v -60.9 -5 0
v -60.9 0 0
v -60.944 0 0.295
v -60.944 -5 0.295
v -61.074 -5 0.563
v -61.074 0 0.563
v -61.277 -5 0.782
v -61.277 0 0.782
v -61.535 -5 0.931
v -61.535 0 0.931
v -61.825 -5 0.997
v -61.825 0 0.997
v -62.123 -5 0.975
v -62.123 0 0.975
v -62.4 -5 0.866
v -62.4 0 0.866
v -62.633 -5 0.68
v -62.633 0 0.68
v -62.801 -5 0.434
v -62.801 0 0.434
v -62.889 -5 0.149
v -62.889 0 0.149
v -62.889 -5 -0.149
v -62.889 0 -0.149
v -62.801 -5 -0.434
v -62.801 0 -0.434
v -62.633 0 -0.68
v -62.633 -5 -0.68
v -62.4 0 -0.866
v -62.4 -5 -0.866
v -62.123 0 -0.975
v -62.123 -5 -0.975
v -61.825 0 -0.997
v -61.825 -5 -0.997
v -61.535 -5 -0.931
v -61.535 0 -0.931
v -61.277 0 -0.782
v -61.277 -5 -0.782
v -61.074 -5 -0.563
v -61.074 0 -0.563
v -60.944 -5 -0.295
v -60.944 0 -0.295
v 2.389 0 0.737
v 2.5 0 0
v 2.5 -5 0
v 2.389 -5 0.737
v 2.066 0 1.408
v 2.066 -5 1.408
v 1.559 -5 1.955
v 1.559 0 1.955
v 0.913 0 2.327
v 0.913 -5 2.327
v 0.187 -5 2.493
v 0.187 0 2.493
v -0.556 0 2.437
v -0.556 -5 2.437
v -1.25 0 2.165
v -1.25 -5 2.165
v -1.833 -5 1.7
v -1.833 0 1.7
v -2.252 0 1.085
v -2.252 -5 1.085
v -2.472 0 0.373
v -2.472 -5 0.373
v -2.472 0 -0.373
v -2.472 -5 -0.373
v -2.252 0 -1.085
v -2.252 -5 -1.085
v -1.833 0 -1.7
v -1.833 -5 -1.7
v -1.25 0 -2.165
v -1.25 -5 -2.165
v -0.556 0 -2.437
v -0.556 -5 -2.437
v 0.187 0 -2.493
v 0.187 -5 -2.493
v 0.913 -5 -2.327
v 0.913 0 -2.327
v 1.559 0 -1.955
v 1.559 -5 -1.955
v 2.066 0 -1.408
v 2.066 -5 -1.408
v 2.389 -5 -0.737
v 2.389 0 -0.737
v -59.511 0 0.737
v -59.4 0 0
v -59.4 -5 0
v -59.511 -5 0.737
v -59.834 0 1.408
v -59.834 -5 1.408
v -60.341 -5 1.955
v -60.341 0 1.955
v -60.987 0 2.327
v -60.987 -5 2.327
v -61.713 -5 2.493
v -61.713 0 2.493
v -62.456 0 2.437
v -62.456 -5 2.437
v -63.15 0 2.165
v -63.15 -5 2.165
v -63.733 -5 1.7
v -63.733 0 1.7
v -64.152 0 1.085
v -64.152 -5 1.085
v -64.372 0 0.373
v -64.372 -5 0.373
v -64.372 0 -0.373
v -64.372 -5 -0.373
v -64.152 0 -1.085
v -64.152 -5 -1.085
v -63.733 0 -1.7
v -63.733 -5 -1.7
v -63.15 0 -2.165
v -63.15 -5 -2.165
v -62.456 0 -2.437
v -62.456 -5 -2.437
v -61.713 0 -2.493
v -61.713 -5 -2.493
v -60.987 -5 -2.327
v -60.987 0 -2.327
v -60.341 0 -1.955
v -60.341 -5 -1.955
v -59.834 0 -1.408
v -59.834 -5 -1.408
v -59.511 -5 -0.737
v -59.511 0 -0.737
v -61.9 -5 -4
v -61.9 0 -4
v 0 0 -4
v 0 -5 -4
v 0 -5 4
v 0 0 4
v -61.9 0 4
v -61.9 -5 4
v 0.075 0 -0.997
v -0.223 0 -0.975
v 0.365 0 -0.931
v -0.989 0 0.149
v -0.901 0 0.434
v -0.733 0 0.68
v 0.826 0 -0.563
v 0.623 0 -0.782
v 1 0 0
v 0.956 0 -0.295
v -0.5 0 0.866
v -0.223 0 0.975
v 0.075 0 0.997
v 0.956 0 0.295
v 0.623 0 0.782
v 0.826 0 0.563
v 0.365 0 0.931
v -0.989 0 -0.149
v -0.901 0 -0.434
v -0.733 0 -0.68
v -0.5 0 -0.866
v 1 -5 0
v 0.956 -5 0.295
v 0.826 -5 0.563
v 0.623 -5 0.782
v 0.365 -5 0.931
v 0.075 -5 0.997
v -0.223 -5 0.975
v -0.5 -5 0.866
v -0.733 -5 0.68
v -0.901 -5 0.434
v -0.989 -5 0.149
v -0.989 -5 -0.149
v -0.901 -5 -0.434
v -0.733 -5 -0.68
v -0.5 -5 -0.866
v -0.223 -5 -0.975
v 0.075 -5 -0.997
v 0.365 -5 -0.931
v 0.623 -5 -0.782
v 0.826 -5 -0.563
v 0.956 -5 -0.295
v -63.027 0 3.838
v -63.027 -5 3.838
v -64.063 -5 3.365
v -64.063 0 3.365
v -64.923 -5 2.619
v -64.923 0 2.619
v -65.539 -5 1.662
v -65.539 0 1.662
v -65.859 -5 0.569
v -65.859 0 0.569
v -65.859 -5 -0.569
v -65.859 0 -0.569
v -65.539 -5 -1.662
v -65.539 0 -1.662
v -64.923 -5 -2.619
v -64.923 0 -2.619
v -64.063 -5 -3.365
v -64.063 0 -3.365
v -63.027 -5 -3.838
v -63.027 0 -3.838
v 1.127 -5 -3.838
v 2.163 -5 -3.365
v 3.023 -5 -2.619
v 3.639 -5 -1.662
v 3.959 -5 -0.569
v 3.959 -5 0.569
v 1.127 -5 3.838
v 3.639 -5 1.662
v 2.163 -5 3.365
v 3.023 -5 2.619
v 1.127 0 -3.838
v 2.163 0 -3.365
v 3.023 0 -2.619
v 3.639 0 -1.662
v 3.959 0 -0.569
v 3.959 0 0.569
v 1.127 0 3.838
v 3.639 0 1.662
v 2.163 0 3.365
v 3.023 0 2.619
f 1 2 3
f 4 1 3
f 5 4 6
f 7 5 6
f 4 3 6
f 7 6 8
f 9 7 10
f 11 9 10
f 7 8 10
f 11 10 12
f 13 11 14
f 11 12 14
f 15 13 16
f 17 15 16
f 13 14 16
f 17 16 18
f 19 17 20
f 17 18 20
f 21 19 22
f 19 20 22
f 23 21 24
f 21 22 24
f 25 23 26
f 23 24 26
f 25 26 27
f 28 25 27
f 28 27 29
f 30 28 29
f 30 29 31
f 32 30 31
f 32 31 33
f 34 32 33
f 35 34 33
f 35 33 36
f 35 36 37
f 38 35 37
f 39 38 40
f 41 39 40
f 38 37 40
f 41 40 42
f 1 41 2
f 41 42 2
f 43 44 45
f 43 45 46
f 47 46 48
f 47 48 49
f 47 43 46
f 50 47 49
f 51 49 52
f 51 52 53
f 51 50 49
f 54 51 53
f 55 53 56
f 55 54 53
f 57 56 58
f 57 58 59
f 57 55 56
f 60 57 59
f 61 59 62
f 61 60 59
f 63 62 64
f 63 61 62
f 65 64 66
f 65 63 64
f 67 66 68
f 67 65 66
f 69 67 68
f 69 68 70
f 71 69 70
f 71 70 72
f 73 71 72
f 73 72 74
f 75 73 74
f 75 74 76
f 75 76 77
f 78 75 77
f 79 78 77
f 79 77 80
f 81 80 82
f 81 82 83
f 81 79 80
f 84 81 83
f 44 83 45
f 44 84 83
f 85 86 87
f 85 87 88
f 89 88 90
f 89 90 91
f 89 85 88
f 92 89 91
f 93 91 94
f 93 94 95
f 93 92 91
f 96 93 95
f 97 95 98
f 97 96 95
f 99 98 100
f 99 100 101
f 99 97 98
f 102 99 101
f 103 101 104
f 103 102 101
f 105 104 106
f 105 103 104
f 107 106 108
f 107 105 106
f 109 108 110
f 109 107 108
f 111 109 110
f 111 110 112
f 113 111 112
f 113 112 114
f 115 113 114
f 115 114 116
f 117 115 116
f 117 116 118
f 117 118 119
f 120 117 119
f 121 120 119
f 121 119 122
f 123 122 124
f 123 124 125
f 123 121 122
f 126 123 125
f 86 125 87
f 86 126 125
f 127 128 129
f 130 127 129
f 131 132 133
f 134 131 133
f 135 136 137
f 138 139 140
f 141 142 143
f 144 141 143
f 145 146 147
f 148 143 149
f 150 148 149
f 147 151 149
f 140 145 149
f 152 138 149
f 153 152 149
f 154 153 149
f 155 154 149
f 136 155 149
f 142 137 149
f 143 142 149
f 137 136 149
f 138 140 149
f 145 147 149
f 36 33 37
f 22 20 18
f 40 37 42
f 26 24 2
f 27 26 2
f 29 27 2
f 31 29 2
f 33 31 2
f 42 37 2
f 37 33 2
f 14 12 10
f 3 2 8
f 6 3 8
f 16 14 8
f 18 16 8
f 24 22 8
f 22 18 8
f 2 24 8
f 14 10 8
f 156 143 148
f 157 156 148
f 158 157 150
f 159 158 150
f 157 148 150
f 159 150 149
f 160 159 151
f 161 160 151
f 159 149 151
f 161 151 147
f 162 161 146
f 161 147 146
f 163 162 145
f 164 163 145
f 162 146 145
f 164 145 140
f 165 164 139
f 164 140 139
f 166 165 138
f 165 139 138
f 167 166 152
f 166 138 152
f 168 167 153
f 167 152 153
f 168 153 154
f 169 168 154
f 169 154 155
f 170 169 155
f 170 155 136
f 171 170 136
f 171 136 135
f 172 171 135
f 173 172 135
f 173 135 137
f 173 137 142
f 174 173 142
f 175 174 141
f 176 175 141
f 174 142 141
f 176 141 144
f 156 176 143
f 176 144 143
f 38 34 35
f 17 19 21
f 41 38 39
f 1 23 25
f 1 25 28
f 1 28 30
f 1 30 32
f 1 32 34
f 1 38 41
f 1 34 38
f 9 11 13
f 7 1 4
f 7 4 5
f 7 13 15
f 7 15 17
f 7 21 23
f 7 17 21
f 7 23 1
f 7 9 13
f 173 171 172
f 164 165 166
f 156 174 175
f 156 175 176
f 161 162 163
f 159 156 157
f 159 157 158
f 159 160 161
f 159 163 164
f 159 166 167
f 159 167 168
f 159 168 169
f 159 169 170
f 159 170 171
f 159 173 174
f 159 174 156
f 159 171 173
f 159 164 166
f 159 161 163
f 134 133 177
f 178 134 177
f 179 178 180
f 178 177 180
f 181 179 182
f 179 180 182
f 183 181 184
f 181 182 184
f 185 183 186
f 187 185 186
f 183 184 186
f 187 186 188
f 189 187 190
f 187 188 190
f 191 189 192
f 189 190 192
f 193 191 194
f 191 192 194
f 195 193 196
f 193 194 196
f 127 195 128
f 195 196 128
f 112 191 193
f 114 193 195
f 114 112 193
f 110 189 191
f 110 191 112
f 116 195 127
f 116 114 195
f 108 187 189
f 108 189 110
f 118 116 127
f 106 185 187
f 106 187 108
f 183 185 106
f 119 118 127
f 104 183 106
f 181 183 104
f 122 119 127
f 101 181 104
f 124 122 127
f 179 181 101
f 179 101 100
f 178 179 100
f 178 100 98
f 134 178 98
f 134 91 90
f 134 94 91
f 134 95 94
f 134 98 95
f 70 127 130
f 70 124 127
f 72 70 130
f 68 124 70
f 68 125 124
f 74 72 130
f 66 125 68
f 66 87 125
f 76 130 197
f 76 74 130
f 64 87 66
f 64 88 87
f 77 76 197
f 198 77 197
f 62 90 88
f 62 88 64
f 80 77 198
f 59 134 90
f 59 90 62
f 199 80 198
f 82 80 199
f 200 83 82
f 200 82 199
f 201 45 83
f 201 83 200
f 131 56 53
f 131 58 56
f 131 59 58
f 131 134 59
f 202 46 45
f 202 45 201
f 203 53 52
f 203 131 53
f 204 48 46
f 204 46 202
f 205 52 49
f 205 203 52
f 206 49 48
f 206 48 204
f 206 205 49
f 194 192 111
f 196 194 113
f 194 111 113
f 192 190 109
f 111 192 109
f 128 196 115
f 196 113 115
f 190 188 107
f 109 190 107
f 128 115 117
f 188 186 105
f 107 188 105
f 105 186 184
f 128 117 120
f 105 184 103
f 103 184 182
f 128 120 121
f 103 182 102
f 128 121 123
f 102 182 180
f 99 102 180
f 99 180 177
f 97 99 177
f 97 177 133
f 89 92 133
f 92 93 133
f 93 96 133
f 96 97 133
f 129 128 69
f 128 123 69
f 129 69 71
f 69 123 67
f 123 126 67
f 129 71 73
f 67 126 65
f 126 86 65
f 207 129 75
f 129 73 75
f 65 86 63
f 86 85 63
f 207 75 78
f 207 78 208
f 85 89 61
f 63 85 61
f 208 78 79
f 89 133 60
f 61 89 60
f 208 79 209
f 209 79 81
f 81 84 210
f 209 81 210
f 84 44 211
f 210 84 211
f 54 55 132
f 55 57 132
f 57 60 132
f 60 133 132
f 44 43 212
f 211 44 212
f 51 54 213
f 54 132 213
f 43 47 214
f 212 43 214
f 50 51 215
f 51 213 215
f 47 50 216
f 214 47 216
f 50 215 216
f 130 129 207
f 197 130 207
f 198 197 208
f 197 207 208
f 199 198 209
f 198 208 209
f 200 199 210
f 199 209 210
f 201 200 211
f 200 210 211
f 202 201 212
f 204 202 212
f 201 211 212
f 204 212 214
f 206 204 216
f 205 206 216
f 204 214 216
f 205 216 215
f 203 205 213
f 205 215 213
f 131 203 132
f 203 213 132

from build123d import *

# Parameters (mm, degrees)
F0_R     = 2.5
F0_R_2   = 1
F1_DEPTH = 5


with BuildPart() as f1:
    # F0 (on Front) → F1 (new body)
    with BuildSketch(Plane.XZ):
        with BuildLine():
            Line((-61.9, -4), (0, -4))
            ThreePointArc((0, -4), (4, 0), (0, 4))
            Line((0, 4), (-61.9, 4))
            ThreePointArc((-61.9, 4), (-65.9, 0), (-61.9, -4))
        make_face()
        with Locations((-61.9, 0)):
            Circle(F0_R, mode=Mode.SUBTRACT)
        Circle(F0_R, mode=Mode.SUBTRACT)
        with Locations((-61.9, 0)):
            Circle(F0_R_2)
        Circle(F0_R_2)
    extrude(amount=F1_DEPTH)


solid = f1.part
